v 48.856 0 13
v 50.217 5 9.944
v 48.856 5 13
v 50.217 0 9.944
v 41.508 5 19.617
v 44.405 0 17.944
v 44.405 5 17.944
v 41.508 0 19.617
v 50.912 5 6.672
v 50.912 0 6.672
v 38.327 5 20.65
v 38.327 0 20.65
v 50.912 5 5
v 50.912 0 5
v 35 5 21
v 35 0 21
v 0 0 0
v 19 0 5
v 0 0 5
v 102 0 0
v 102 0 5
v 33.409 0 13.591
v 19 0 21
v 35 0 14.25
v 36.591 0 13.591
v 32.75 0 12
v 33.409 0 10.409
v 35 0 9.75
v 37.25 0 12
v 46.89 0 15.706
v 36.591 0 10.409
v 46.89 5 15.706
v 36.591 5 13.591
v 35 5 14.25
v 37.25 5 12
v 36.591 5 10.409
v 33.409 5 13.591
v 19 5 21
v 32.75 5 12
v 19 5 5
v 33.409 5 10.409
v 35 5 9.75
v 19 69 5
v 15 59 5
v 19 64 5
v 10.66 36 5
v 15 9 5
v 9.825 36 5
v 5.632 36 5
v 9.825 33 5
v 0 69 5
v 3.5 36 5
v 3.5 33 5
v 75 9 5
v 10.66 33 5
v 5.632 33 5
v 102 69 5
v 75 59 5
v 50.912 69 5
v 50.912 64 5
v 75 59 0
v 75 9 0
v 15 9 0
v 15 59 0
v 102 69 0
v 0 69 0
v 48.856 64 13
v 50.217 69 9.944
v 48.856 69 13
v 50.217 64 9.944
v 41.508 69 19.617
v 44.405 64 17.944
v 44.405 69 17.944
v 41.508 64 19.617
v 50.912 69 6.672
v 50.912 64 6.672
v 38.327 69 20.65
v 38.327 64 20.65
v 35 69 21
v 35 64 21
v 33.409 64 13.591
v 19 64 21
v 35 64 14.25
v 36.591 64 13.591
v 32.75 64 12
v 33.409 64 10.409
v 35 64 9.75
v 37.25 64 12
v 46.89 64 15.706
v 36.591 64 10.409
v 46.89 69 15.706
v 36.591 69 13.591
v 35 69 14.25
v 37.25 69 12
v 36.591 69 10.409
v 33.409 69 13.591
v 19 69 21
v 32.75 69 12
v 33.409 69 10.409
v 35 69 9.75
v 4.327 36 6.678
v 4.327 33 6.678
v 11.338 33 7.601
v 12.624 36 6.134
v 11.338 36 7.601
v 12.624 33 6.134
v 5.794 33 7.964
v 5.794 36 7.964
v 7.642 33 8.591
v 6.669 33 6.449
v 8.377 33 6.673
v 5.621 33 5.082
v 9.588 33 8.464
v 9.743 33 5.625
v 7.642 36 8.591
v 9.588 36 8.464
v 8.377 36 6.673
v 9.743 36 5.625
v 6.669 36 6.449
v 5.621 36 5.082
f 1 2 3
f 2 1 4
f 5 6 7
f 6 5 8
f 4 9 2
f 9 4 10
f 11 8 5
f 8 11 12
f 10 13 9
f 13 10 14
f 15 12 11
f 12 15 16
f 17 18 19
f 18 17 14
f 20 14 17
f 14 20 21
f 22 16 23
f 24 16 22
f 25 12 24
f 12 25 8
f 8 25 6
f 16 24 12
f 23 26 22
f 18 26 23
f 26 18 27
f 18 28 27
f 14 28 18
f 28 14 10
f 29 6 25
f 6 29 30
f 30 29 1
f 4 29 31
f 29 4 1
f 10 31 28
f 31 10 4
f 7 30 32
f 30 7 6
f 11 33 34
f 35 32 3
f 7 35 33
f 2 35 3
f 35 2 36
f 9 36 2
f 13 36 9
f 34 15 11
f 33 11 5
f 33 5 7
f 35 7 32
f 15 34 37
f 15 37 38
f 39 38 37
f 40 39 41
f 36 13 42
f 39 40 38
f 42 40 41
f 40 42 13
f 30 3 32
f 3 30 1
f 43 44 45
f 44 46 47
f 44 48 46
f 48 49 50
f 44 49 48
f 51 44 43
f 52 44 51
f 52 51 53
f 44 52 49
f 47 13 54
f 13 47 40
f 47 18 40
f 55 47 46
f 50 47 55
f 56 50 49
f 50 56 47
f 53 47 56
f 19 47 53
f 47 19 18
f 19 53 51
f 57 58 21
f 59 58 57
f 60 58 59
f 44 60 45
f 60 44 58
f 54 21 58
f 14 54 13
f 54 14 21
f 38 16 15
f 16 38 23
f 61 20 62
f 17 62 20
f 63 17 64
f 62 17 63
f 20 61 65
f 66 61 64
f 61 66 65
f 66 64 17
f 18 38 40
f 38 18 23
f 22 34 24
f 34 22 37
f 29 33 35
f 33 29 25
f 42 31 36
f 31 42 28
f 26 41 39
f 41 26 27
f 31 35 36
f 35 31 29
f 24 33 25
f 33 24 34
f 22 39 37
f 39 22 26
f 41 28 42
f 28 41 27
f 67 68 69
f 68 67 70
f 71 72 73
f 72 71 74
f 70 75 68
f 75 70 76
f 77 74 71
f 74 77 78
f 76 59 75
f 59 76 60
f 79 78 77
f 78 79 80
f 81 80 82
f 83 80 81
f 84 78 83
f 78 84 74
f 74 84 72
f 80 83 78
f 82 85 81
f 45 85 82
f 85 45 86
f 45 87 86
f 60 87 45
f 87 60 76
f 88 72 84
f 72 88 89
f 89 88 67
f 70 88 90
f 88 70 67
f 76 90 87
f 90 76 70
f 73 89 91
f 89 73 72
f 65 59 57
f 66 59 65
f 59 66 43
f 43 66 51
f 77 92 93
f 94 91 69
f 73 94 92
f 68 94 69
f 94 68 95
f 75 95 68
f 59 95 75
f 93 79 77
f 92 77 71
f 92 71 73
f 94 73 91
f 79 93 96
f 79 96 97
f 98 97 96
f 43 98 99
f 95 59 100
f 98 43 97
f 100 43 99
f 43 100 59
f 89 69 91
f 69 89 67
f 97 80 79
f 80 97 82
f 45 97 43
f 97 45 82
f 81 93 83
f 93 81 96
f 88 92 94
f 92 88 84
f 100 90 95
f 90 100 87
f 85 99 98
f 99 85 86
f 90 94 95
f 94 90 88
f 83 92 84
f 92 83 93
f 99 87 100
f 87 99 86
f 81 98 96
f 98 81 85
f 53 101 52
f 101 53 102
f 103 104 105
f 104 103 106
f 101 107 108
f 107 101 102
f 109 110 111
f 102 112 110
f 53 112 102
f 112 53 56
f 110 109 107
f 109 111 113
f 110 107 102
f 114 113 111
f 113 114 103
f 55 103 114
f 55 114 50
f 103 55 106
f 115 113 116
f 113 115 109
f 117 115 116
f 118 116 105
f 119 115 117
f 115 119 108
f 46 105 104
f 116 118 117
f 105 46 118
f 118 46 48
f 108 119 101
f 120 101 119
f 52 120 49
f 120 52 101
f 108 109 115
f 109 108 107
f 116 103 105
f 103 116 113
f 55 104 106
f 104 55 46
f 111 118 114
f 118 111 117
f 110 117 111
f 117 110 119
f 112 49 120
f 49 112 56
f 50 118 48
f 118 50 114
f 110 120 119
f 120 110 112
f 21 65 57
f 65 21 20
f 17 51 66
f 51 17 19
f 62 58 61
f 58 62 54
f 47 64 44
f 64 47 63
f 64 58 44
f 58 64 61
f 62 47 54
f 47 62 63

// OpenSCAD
// prototype pedal 
plate_width = 102;
plate_length = 69;
plate_height = 5;

helperplate_width = 30;
helperplate_length = 5;
helperplate_height = 8;

spring_point = 55;

plate_hole_width = 60;
plate_hole_length = 50;
plate_hole_height = 8;


plate_dimensions = [
	plate_width,
	plate_length,
	plate_height];

hole_dimensions = [
	plate_hole_width,
	plate_hole_length,
	plate_hole_height];
	
drillhole_gap = 10;
drillhole_diameter = 4.5;
drillhole_spring_diameter = 6.5;
edge_gap = drillhole_gap + drillhole_diameter / 2; 


//https://www.reddit.com/r/openscad/comments/loask5/half_sphere_cropping_how_do_i_cut_things/
module halfcylinder(he,rd) {
difference(){
cylinder (h=he,r=rd);
translate ([0,-rd-0.1,-0.1]) cube([rd+0.1,rd*2+0.2,he+0.2]);
} // df
} // mod
cylinder_radius = 16;
cylinder_height = 5;

// use this command to get 2D redering -> deswegen auch alles rotiert
//projection(){
union(){

//linker Bügel
//rotate([90,0,0])
difference(){
    union(){
	translate([19,0,0])	
		cube([16,5,21]);

        translate([35, 0, 5])
        rotate([270,90,0])
        //color("blue")
        halfcylinder(cylinder_height,cylinder_radius);
    };
	
	translate([35, 0, 12])
    rotate([90,90,0])
	//color("black")
    cylinder(d = drillhole_diameter, h=cylinder_height + 60, center = true);
}


//rechte Bügel
//rotate([90,0,0])
difference(){
    union(){
        translate([19,64,0])	
		cube([16,5,21]);
		
        translate([35, plate_length-5, 5])
        rotate([270,90,0])
        //color("green")
        halfcylinder(cylinder_height,cylinder_radius);
		
    };
	
	translate([35, plate_length-5, 12])
		rotate([90,90,0])
		//color("black")
		cylinder(d = drillhole_diameter, h=cylinder_height + 60, center = true);
	
	translate([plate_width/2, plate_length-23-cylinder_height, 15])
    rotate([90,90,0])
	//color("white")
    cylinder(d = drillhole_diameter, h=cylinder_height + 5, center = true);
}

//haken nupsi
rotate([00,-30,0])
translate([13,0,-6])
difference(){
		translate([plate_width/2-spring_point, plate_length/2-3/2, plate_height])
		rotate([270,90,0])
			//color("yellow")
		halfcylinder(3,5);
		
		translate([plate_width/2-spring_point, plate_length/2, plate_height+1])
		rotate([90,90,0])
		cylinder(d = drillhole_diameter, h=cylinder_height + 5, center = true);		
}



//hier ziehen wir sachen von anderen sachen ab
//rotate([90,0,0])
difference(){
   	
	cube(plate_dimensions);
	translate([15,9,-2])
	cube(hole_dimensions);
	}
	
	
//}

}
